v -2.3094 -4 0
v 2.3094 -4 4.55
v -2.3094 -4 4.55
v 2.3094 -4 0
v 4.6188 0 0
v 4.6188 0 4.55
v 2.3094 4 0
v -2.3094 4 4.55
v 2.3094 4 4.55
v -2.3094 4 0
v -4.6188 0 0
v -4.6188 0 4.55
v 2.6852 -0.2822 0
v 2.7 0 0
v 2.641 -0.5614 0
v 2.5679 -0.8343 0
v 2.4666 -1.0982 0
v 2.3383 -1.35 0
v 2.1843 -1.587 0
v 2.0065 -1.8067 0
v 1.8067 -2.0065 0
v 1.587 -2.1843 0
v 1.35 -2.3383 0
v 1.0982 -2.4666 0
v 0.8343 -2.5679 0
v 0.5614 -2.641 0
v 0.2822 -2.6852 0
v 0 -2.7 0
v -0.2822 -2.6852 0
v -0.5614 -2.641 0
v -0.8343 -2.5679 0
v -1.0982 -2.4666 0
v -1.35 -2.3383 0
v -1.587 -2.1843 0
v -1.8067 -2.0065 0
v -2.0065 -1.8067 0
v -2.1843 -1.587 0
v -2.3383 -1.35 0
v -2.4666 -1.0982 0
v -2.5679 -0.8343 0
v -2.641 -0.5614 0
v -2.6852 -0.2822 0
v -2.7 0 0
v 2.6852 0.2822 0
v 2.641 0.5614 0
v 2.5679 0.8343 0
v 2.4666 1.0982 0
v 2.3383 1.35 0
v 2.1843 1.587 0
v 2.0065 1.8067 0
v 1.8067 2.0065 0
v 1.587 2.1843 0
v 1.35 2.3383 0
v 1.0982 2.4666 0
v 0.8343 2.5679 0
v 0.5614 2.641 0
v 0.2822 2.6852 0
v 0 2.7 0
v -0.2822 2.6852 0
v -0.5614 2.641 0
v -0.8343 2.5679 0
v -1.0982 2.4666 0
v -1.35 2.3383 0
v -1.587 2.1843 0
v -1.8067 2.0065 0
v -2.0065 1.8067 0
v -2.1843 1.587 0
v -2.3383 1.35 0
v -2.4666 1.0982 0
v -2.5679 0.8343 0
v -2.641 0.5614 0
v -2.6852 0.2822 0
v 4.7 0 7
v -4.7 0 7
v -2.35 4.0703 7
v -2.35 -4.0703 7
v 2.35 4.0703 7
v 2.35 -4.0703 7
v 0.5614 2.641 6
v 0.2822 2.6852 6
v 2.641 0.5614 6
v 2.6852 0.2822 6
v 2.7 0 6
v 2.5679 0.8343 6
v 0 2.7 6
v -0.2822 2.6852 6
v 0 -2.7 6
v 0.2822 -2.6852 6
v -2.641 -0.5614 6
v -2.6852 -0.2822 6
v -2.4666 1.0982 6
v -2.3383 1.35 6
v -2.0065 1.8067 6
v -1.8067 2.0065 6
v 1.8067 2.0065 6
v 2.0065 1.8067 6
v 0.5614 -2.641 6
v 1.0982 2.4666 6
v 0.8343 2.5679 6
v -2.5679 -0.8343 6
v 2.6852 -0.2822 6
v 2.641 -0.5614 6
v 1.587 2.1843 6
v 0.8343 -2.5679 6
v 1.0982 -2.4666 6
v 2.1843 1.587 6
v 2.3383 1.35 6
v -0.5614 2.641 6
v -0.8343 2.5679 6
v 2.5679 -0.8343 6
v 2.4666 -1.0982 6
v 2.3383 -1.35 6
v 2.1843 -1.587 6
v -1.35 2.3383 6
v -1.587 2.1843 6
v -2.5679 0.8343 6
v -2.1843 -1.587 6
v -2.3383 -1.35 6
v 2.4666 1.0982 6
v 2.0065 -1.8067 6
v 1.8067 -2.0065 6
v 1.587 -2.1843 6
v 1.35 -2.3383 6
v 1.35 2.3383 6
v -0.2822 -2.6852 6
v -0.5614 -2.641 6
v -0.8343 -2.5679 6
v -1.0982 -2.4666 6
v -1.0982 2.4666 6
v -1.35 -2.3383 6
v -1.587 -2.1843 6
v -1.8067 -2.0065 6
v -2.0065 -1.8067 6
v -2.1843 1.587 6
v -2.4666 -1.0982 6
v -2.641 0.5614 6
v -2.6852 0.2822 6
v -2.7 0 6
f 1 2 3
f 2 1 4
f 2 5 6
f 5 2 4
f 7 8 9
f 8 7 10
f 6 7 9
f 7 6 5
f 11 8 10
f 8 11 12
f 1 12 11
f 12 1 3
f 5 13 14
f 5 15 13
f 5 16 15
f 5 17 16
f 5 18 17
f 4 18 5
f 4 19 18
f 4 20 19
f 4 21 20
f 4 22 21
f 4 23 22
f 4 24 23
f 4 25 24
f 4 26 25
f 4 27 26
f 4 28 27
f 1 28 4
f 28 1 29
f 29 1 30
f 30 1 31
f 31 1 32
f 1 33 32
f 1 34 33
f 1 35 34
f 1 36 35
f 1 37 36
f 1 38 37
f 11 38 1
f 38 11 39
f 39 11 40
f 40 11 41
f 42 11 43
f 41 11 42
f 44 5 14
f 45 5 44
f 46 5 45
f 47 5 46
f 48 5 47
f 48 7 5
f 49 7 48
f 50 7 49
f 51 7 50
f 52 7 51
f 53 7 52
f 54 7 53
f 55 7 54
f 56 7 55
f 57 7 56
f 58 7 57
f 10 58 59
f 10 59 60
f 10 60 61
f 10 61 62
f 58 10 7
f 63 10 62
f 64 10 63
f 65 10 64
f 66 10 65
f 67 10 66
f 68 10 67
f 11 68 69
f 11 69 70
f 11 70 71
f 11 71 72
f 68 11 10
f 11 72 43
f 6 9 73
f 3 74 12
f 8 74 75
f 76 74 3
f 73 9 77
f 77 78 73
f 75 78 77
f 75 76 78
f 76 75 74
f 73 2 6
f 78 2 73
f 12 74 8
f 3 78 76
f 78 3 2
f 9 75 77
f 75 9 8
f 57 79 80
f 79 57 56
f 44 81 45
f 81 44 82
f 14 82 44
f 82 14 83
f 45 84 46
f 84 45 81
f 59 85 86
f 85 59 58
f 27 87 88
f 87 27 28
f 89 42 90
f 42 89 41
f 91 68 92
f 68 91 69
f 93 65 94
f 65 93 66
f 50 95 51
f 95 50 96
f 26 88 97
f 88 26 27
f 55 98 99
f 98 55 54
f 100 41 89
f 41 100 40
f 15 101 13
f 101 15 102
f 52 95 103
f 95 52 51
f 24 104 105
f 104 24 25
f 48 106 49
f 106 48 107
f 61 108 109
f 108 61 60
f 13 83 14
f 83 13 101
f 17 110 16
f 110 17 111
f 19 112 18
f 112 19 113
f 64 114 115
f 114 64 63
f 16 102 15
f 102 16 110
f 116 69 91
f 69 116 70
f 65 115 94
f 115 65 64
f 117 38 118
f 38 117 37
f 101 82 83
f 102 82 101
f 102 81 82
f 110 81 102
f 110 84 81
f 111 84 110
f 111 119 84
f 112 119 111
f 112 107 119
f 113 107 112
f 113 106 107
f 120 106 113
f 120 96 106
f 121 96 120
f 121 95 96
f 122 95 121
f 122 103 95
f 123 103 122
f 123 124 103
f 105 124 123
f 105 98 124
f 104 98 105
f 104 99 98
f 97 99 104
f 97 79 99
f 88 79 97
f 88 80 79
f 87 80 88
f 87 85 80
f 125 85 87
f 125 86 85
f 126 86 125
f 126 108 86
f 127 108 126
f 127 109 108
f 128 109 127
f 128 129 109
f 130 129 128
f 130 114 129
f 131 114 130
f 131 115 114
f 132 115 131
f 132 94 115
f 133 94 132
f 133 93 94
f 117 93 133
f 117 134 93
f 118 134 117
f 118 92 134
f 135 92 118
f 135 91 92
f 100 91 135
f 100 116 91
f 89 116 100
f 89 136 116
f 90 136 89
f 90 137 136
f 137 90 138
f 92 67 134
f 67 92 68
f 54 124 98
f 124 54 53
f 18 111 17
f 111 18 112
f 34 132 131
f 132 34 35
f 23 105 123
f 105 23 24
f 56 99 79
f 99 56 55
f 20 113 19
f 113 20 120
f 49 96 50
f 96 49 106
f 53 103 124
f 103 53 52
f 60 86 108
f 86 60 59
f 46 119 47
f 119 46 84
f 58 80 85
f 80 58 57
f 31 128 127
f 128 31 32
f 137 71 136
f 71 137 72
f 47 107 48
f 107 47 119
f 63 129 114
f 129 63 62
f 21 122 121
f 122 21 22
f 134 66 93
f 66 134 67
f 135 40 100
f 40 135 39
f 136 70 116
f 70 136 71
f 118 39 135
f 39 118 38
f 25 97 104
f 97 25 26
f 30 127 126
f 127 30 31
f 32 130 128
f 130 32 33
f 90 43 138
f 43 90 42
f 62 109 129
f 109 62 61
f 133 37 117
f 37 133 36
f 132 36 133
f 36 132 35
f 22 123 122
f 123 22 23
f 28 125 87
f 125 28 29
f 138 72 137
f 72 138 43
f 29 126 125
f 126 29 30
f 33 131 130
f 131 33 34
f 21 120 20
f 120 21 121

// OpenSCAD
// Blind cap nut.
$fn = 60;
eps = 0.02;
thread_d = 5.4;
flat = 8;
height = 7;
body_h = height*0.65;
difference() {
    union() {
        cylinder(d=flat/cos(30),h=body_h,$fn=6);
        translate([0,0,body_h]) cylinder(d1=flat/cos(30),d2=thread_d+4,h=height-body_h,$fn=6);
    }
    translate([0,0,-eps]) cylinder(d=thread_d,h=height-1+eps);
}
